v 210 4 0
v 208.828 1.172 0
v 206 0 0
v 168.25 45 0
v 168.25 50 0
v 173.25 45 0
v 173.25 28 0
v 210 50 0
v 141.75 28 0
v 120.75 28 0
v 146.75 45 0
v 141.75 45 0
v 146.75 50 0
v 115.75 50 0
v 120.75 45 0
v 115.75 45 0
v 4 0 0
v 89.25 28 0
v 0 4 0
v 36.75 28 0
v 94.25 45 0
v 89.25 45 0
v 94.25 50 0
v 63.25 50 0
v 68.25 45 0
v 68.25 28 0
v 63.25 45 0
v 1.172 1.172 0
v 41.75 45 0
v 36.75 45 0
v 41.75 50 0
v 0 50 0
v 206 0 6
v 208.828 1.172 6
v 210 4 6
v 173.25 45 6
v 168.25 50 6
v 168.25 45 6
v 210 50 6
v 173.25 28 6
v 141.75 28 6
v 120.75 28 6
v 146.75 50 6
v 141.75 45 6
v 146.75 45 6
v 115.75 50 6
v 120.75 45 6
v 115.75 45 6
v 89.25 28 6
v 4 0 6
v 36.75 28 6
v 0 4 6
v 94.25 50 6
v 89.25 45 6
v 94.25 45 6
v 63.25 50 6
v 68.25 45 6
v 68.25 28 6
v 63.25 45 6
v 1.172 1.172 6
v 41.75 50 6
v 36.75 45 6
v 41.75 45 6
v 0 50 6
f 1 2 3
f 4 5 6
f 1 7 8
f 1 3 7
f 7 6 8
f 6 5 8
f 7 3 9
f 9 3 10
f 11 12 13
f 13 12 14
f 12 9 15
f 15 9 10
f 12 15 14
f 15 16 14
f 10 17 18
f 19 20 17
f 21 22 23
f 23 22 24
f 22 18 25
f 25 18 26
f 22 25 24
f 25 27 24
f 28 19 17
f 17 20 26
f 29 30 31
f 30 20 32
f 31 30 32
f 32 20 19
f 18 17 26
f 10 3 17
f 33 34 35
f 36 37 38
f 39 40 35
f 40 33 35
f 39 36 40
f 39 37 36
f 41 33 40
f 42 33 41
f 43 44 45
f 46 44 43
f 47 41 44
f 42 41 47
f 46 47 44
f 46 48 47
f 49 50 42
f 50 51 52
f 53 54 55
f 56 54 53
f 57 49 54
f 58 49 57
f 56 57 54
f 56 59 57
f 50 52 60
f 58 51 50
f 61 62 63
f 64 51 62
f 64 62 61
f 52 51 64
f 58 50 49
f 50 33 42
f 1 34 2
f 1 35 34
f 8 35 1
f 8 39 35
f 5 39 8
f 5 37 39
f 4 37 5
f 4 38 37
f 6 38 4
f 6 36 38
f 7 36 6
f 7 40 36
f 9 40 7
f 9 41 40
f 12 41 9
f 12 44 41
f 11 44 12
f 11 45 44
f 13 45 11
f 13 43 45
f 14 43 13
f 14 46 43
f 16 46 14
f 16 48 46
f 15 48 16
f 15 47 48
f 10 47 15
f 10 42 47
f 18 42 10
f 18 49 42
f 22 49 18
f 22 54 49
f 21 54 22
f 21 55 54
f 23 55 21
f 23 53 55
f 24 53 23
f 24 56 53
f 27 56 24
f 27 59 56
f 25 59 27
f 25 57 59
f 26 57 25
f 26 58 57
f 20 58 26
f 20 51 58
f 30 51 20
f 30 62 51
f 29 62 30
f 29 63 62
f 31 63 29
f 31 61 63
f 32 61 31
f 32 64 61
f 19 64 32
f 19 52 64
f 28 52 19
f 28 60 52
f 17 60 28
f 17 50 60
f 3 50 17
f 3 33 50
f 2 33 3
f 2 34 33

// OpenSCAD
$fn = 32;

// ----------------------------------------------------------------------
// Oversize slot bar: 210 mm bar with 3 oversize windows
// ----------------------------------------------------------------------

// --- parameters (mm) ---
profile_height = 6;       // extrusion height
profile_points = 32;      // points of the closed outline

profile = [[0, 4], [1.172, 1.172], [4, 0], [206, 0], [208.828, 1.172], [210, 4], [210, 50], [168.25, 50], [168.25, 45], [173.25, 45], [173.25, 28], [141.75, 28], [141.75, 45], [146.75, 45], [146.75, 50], [115.75, 50], [115.75, 45], [120.75, 45], [120.75, 28], [89.25, 28], [89.25, 45], [94.25, 45], [94.25, 50], [63.25, 50], [63.25, 45], [68.25, 45], [68.25, 28], [36.75, 28], [36.75, 45], [41.75, 45], [41.75, 50], [0, 50]];  // single closed polygon, 32 points, counter clockwise

// --- the one profile operation ---
linear_extrude(height = profile_height) polygon(points = profile);
